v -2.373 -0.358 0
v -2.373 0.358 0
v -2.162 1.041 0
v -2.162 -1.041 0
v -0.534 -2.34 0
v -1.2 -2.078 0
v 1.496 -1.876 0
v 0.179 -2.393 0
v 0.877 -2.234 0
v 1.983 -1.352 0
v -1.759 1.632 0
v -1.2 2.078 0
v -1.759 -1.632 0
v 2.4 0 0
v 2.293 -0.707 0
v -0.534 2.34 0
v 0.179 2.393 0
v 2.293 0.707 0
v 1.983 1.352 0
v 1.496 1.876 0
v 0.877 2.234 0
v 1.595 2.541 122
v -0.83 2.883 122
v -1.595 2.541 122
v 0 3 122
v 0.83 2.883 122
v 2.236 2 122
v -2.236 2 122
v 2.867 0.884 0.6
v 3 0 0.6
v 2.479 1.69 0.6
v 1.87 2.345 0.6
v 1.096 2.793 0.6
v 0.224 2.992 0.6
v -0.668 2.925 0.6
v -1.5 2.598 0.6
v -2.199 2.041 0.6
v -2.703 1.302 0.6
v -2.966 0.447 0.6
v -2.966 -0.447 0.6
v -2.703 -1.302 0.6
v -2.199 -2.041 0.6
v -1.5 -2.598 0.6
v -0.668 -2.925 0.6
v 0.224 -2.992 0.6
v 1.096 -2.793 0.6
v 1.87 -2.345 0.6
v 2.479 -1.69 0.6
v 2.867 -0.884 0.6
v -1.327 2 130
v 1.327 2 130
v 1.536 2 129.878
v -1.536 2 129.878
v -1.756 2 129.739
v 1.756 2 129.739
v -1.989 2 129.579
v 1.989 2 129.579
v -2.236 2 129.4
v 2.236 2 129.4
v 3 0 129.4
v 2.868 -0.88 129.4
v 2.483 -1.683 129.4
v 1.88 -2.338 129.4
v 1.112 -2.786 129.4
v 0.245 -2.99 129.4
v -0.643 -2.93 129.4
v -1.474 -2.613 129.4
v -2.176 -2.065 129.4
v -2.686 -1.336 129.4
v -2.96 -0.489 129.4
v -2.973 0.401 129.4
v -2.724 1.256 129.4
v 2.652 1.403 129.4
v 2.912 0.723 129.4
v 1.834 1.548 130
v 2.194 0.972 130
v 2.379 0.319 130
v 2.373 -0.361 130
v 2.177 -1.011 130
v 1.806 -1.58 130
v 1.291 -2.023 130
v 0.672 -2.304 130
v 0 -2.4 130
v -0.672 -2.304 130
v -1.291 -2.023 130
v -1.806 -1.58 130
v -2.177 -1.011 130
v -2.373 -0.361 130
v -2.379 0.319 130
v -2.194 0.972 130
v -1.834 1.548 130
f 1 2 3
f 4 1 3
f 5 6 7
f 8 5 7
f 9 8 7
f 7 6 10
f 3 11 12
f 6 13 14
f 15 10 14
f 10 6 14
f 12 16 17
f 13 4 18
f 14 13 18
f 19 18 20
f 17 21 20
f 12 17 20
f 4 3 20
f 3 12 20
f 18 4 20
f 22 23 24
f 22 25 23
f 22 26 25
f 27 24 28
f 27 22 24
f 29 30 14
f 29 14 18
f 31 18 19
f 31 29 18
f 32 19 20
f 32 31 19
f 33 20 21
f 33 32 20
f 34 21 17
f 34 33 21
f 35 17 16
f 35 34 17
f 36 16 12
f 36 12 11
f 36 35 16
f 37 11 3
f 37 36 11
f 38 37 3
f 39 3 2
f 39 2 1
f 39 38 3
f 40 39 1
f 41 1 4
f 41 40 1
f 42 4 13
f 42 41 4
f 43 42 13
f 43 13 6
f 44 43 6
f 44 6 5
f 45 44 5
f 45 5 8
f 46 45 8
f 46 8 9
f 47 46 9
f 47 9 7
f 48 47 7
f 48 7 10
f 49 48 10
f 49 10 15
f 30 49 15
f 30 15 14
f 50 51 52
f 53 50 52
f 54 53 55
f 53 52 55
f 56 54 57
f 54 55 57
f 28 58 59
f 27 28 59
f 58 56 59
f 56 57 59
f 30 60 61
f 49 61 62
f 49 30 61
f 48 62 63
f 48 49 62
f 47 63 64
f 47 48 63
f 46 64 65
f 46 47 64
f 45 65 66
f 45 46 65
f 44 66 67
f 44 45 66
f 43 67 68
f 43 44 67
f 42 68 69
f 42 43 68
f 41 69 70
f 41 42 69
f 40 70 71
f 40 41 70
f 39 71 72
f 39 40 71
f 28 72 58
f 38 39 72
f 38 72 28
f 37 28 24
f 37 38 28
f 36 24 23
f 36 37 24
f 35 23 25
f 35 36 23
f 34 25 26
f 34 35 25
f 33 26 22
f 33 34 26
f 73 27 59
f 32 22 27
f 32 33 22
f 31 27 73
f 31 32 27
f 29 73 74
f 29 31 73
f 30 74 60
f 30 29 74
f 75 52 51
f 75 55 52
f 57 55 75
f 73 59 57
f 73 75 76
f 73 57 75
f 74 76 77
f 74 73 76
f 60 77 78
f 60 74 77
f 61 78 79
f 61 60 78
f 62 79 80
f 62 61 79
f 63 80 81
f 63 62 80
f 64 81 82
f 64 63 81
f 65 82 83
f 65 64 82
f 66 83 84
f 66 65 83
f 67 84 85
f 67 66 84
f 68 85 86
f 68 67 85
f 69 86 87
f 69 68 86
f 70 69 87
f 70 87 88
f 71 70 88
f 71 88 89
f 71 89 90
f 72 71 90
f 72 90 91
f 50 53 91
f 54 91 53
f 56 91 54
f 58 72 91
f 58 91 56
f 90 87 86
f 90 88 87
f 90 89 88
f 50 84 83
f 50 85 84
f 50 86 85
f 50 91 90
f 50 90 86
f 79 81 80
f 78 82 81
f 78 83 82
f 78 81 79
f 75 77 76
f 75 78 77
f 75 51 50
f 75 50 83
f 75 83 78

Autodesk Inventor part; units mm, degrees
ref_plane "YZ Plane" through (0, 0, 0) normal (1, 0, 0) x (0, 1, 0)
ref_plane "XZ Plane" through (0, 0, 0) normal (0, 1, 0) x (-1, 0, 0)
ref_plane "XY Plane" through (0, 0, 0) normal (0, 0, 1) x (1, 0, 0)
sketch "Sketch1" plane through (0, 0, 0) normal (0, 0, 1) x (1, 0, 0)
  circle A0 centre (0, 0) radius 3
  dimension "d0" = 6
extrude "Extrusion1" add sketch "Sketch1" along normal blind 130
thread "Thread1" size "M6x0.5" class "6g" standard "ISO Metric profile" full length
chamfer "Chamfer1" distance 0.6 angle 45 1 edges at (-3, 0, 130)
chamfer "Chamfer2" distance 0.6 angle 45 1 edges at (-3, 0, 0)
sketch "Sketch2" plane through (0, 0, 130) normal (0, 0, 1) x (1, 0, 0)
  line L0 (3.8696, 4.6025) -> (-3.8038, 4.6025)
  line L1 (-3.8038, 4.6025) -> (-3.8038, 2)
  line L2 (-3.8038, 2) -> (3.8696, 2)
  line L3 (3.8696, 2) -> (3.8696, 4.6025)
  point P0 (0, 0)
  dimension "d11" = 2
extrude "Extrusion2" cut sketch "Sketch2" against normal blind 8
properties part number "popychacz"
